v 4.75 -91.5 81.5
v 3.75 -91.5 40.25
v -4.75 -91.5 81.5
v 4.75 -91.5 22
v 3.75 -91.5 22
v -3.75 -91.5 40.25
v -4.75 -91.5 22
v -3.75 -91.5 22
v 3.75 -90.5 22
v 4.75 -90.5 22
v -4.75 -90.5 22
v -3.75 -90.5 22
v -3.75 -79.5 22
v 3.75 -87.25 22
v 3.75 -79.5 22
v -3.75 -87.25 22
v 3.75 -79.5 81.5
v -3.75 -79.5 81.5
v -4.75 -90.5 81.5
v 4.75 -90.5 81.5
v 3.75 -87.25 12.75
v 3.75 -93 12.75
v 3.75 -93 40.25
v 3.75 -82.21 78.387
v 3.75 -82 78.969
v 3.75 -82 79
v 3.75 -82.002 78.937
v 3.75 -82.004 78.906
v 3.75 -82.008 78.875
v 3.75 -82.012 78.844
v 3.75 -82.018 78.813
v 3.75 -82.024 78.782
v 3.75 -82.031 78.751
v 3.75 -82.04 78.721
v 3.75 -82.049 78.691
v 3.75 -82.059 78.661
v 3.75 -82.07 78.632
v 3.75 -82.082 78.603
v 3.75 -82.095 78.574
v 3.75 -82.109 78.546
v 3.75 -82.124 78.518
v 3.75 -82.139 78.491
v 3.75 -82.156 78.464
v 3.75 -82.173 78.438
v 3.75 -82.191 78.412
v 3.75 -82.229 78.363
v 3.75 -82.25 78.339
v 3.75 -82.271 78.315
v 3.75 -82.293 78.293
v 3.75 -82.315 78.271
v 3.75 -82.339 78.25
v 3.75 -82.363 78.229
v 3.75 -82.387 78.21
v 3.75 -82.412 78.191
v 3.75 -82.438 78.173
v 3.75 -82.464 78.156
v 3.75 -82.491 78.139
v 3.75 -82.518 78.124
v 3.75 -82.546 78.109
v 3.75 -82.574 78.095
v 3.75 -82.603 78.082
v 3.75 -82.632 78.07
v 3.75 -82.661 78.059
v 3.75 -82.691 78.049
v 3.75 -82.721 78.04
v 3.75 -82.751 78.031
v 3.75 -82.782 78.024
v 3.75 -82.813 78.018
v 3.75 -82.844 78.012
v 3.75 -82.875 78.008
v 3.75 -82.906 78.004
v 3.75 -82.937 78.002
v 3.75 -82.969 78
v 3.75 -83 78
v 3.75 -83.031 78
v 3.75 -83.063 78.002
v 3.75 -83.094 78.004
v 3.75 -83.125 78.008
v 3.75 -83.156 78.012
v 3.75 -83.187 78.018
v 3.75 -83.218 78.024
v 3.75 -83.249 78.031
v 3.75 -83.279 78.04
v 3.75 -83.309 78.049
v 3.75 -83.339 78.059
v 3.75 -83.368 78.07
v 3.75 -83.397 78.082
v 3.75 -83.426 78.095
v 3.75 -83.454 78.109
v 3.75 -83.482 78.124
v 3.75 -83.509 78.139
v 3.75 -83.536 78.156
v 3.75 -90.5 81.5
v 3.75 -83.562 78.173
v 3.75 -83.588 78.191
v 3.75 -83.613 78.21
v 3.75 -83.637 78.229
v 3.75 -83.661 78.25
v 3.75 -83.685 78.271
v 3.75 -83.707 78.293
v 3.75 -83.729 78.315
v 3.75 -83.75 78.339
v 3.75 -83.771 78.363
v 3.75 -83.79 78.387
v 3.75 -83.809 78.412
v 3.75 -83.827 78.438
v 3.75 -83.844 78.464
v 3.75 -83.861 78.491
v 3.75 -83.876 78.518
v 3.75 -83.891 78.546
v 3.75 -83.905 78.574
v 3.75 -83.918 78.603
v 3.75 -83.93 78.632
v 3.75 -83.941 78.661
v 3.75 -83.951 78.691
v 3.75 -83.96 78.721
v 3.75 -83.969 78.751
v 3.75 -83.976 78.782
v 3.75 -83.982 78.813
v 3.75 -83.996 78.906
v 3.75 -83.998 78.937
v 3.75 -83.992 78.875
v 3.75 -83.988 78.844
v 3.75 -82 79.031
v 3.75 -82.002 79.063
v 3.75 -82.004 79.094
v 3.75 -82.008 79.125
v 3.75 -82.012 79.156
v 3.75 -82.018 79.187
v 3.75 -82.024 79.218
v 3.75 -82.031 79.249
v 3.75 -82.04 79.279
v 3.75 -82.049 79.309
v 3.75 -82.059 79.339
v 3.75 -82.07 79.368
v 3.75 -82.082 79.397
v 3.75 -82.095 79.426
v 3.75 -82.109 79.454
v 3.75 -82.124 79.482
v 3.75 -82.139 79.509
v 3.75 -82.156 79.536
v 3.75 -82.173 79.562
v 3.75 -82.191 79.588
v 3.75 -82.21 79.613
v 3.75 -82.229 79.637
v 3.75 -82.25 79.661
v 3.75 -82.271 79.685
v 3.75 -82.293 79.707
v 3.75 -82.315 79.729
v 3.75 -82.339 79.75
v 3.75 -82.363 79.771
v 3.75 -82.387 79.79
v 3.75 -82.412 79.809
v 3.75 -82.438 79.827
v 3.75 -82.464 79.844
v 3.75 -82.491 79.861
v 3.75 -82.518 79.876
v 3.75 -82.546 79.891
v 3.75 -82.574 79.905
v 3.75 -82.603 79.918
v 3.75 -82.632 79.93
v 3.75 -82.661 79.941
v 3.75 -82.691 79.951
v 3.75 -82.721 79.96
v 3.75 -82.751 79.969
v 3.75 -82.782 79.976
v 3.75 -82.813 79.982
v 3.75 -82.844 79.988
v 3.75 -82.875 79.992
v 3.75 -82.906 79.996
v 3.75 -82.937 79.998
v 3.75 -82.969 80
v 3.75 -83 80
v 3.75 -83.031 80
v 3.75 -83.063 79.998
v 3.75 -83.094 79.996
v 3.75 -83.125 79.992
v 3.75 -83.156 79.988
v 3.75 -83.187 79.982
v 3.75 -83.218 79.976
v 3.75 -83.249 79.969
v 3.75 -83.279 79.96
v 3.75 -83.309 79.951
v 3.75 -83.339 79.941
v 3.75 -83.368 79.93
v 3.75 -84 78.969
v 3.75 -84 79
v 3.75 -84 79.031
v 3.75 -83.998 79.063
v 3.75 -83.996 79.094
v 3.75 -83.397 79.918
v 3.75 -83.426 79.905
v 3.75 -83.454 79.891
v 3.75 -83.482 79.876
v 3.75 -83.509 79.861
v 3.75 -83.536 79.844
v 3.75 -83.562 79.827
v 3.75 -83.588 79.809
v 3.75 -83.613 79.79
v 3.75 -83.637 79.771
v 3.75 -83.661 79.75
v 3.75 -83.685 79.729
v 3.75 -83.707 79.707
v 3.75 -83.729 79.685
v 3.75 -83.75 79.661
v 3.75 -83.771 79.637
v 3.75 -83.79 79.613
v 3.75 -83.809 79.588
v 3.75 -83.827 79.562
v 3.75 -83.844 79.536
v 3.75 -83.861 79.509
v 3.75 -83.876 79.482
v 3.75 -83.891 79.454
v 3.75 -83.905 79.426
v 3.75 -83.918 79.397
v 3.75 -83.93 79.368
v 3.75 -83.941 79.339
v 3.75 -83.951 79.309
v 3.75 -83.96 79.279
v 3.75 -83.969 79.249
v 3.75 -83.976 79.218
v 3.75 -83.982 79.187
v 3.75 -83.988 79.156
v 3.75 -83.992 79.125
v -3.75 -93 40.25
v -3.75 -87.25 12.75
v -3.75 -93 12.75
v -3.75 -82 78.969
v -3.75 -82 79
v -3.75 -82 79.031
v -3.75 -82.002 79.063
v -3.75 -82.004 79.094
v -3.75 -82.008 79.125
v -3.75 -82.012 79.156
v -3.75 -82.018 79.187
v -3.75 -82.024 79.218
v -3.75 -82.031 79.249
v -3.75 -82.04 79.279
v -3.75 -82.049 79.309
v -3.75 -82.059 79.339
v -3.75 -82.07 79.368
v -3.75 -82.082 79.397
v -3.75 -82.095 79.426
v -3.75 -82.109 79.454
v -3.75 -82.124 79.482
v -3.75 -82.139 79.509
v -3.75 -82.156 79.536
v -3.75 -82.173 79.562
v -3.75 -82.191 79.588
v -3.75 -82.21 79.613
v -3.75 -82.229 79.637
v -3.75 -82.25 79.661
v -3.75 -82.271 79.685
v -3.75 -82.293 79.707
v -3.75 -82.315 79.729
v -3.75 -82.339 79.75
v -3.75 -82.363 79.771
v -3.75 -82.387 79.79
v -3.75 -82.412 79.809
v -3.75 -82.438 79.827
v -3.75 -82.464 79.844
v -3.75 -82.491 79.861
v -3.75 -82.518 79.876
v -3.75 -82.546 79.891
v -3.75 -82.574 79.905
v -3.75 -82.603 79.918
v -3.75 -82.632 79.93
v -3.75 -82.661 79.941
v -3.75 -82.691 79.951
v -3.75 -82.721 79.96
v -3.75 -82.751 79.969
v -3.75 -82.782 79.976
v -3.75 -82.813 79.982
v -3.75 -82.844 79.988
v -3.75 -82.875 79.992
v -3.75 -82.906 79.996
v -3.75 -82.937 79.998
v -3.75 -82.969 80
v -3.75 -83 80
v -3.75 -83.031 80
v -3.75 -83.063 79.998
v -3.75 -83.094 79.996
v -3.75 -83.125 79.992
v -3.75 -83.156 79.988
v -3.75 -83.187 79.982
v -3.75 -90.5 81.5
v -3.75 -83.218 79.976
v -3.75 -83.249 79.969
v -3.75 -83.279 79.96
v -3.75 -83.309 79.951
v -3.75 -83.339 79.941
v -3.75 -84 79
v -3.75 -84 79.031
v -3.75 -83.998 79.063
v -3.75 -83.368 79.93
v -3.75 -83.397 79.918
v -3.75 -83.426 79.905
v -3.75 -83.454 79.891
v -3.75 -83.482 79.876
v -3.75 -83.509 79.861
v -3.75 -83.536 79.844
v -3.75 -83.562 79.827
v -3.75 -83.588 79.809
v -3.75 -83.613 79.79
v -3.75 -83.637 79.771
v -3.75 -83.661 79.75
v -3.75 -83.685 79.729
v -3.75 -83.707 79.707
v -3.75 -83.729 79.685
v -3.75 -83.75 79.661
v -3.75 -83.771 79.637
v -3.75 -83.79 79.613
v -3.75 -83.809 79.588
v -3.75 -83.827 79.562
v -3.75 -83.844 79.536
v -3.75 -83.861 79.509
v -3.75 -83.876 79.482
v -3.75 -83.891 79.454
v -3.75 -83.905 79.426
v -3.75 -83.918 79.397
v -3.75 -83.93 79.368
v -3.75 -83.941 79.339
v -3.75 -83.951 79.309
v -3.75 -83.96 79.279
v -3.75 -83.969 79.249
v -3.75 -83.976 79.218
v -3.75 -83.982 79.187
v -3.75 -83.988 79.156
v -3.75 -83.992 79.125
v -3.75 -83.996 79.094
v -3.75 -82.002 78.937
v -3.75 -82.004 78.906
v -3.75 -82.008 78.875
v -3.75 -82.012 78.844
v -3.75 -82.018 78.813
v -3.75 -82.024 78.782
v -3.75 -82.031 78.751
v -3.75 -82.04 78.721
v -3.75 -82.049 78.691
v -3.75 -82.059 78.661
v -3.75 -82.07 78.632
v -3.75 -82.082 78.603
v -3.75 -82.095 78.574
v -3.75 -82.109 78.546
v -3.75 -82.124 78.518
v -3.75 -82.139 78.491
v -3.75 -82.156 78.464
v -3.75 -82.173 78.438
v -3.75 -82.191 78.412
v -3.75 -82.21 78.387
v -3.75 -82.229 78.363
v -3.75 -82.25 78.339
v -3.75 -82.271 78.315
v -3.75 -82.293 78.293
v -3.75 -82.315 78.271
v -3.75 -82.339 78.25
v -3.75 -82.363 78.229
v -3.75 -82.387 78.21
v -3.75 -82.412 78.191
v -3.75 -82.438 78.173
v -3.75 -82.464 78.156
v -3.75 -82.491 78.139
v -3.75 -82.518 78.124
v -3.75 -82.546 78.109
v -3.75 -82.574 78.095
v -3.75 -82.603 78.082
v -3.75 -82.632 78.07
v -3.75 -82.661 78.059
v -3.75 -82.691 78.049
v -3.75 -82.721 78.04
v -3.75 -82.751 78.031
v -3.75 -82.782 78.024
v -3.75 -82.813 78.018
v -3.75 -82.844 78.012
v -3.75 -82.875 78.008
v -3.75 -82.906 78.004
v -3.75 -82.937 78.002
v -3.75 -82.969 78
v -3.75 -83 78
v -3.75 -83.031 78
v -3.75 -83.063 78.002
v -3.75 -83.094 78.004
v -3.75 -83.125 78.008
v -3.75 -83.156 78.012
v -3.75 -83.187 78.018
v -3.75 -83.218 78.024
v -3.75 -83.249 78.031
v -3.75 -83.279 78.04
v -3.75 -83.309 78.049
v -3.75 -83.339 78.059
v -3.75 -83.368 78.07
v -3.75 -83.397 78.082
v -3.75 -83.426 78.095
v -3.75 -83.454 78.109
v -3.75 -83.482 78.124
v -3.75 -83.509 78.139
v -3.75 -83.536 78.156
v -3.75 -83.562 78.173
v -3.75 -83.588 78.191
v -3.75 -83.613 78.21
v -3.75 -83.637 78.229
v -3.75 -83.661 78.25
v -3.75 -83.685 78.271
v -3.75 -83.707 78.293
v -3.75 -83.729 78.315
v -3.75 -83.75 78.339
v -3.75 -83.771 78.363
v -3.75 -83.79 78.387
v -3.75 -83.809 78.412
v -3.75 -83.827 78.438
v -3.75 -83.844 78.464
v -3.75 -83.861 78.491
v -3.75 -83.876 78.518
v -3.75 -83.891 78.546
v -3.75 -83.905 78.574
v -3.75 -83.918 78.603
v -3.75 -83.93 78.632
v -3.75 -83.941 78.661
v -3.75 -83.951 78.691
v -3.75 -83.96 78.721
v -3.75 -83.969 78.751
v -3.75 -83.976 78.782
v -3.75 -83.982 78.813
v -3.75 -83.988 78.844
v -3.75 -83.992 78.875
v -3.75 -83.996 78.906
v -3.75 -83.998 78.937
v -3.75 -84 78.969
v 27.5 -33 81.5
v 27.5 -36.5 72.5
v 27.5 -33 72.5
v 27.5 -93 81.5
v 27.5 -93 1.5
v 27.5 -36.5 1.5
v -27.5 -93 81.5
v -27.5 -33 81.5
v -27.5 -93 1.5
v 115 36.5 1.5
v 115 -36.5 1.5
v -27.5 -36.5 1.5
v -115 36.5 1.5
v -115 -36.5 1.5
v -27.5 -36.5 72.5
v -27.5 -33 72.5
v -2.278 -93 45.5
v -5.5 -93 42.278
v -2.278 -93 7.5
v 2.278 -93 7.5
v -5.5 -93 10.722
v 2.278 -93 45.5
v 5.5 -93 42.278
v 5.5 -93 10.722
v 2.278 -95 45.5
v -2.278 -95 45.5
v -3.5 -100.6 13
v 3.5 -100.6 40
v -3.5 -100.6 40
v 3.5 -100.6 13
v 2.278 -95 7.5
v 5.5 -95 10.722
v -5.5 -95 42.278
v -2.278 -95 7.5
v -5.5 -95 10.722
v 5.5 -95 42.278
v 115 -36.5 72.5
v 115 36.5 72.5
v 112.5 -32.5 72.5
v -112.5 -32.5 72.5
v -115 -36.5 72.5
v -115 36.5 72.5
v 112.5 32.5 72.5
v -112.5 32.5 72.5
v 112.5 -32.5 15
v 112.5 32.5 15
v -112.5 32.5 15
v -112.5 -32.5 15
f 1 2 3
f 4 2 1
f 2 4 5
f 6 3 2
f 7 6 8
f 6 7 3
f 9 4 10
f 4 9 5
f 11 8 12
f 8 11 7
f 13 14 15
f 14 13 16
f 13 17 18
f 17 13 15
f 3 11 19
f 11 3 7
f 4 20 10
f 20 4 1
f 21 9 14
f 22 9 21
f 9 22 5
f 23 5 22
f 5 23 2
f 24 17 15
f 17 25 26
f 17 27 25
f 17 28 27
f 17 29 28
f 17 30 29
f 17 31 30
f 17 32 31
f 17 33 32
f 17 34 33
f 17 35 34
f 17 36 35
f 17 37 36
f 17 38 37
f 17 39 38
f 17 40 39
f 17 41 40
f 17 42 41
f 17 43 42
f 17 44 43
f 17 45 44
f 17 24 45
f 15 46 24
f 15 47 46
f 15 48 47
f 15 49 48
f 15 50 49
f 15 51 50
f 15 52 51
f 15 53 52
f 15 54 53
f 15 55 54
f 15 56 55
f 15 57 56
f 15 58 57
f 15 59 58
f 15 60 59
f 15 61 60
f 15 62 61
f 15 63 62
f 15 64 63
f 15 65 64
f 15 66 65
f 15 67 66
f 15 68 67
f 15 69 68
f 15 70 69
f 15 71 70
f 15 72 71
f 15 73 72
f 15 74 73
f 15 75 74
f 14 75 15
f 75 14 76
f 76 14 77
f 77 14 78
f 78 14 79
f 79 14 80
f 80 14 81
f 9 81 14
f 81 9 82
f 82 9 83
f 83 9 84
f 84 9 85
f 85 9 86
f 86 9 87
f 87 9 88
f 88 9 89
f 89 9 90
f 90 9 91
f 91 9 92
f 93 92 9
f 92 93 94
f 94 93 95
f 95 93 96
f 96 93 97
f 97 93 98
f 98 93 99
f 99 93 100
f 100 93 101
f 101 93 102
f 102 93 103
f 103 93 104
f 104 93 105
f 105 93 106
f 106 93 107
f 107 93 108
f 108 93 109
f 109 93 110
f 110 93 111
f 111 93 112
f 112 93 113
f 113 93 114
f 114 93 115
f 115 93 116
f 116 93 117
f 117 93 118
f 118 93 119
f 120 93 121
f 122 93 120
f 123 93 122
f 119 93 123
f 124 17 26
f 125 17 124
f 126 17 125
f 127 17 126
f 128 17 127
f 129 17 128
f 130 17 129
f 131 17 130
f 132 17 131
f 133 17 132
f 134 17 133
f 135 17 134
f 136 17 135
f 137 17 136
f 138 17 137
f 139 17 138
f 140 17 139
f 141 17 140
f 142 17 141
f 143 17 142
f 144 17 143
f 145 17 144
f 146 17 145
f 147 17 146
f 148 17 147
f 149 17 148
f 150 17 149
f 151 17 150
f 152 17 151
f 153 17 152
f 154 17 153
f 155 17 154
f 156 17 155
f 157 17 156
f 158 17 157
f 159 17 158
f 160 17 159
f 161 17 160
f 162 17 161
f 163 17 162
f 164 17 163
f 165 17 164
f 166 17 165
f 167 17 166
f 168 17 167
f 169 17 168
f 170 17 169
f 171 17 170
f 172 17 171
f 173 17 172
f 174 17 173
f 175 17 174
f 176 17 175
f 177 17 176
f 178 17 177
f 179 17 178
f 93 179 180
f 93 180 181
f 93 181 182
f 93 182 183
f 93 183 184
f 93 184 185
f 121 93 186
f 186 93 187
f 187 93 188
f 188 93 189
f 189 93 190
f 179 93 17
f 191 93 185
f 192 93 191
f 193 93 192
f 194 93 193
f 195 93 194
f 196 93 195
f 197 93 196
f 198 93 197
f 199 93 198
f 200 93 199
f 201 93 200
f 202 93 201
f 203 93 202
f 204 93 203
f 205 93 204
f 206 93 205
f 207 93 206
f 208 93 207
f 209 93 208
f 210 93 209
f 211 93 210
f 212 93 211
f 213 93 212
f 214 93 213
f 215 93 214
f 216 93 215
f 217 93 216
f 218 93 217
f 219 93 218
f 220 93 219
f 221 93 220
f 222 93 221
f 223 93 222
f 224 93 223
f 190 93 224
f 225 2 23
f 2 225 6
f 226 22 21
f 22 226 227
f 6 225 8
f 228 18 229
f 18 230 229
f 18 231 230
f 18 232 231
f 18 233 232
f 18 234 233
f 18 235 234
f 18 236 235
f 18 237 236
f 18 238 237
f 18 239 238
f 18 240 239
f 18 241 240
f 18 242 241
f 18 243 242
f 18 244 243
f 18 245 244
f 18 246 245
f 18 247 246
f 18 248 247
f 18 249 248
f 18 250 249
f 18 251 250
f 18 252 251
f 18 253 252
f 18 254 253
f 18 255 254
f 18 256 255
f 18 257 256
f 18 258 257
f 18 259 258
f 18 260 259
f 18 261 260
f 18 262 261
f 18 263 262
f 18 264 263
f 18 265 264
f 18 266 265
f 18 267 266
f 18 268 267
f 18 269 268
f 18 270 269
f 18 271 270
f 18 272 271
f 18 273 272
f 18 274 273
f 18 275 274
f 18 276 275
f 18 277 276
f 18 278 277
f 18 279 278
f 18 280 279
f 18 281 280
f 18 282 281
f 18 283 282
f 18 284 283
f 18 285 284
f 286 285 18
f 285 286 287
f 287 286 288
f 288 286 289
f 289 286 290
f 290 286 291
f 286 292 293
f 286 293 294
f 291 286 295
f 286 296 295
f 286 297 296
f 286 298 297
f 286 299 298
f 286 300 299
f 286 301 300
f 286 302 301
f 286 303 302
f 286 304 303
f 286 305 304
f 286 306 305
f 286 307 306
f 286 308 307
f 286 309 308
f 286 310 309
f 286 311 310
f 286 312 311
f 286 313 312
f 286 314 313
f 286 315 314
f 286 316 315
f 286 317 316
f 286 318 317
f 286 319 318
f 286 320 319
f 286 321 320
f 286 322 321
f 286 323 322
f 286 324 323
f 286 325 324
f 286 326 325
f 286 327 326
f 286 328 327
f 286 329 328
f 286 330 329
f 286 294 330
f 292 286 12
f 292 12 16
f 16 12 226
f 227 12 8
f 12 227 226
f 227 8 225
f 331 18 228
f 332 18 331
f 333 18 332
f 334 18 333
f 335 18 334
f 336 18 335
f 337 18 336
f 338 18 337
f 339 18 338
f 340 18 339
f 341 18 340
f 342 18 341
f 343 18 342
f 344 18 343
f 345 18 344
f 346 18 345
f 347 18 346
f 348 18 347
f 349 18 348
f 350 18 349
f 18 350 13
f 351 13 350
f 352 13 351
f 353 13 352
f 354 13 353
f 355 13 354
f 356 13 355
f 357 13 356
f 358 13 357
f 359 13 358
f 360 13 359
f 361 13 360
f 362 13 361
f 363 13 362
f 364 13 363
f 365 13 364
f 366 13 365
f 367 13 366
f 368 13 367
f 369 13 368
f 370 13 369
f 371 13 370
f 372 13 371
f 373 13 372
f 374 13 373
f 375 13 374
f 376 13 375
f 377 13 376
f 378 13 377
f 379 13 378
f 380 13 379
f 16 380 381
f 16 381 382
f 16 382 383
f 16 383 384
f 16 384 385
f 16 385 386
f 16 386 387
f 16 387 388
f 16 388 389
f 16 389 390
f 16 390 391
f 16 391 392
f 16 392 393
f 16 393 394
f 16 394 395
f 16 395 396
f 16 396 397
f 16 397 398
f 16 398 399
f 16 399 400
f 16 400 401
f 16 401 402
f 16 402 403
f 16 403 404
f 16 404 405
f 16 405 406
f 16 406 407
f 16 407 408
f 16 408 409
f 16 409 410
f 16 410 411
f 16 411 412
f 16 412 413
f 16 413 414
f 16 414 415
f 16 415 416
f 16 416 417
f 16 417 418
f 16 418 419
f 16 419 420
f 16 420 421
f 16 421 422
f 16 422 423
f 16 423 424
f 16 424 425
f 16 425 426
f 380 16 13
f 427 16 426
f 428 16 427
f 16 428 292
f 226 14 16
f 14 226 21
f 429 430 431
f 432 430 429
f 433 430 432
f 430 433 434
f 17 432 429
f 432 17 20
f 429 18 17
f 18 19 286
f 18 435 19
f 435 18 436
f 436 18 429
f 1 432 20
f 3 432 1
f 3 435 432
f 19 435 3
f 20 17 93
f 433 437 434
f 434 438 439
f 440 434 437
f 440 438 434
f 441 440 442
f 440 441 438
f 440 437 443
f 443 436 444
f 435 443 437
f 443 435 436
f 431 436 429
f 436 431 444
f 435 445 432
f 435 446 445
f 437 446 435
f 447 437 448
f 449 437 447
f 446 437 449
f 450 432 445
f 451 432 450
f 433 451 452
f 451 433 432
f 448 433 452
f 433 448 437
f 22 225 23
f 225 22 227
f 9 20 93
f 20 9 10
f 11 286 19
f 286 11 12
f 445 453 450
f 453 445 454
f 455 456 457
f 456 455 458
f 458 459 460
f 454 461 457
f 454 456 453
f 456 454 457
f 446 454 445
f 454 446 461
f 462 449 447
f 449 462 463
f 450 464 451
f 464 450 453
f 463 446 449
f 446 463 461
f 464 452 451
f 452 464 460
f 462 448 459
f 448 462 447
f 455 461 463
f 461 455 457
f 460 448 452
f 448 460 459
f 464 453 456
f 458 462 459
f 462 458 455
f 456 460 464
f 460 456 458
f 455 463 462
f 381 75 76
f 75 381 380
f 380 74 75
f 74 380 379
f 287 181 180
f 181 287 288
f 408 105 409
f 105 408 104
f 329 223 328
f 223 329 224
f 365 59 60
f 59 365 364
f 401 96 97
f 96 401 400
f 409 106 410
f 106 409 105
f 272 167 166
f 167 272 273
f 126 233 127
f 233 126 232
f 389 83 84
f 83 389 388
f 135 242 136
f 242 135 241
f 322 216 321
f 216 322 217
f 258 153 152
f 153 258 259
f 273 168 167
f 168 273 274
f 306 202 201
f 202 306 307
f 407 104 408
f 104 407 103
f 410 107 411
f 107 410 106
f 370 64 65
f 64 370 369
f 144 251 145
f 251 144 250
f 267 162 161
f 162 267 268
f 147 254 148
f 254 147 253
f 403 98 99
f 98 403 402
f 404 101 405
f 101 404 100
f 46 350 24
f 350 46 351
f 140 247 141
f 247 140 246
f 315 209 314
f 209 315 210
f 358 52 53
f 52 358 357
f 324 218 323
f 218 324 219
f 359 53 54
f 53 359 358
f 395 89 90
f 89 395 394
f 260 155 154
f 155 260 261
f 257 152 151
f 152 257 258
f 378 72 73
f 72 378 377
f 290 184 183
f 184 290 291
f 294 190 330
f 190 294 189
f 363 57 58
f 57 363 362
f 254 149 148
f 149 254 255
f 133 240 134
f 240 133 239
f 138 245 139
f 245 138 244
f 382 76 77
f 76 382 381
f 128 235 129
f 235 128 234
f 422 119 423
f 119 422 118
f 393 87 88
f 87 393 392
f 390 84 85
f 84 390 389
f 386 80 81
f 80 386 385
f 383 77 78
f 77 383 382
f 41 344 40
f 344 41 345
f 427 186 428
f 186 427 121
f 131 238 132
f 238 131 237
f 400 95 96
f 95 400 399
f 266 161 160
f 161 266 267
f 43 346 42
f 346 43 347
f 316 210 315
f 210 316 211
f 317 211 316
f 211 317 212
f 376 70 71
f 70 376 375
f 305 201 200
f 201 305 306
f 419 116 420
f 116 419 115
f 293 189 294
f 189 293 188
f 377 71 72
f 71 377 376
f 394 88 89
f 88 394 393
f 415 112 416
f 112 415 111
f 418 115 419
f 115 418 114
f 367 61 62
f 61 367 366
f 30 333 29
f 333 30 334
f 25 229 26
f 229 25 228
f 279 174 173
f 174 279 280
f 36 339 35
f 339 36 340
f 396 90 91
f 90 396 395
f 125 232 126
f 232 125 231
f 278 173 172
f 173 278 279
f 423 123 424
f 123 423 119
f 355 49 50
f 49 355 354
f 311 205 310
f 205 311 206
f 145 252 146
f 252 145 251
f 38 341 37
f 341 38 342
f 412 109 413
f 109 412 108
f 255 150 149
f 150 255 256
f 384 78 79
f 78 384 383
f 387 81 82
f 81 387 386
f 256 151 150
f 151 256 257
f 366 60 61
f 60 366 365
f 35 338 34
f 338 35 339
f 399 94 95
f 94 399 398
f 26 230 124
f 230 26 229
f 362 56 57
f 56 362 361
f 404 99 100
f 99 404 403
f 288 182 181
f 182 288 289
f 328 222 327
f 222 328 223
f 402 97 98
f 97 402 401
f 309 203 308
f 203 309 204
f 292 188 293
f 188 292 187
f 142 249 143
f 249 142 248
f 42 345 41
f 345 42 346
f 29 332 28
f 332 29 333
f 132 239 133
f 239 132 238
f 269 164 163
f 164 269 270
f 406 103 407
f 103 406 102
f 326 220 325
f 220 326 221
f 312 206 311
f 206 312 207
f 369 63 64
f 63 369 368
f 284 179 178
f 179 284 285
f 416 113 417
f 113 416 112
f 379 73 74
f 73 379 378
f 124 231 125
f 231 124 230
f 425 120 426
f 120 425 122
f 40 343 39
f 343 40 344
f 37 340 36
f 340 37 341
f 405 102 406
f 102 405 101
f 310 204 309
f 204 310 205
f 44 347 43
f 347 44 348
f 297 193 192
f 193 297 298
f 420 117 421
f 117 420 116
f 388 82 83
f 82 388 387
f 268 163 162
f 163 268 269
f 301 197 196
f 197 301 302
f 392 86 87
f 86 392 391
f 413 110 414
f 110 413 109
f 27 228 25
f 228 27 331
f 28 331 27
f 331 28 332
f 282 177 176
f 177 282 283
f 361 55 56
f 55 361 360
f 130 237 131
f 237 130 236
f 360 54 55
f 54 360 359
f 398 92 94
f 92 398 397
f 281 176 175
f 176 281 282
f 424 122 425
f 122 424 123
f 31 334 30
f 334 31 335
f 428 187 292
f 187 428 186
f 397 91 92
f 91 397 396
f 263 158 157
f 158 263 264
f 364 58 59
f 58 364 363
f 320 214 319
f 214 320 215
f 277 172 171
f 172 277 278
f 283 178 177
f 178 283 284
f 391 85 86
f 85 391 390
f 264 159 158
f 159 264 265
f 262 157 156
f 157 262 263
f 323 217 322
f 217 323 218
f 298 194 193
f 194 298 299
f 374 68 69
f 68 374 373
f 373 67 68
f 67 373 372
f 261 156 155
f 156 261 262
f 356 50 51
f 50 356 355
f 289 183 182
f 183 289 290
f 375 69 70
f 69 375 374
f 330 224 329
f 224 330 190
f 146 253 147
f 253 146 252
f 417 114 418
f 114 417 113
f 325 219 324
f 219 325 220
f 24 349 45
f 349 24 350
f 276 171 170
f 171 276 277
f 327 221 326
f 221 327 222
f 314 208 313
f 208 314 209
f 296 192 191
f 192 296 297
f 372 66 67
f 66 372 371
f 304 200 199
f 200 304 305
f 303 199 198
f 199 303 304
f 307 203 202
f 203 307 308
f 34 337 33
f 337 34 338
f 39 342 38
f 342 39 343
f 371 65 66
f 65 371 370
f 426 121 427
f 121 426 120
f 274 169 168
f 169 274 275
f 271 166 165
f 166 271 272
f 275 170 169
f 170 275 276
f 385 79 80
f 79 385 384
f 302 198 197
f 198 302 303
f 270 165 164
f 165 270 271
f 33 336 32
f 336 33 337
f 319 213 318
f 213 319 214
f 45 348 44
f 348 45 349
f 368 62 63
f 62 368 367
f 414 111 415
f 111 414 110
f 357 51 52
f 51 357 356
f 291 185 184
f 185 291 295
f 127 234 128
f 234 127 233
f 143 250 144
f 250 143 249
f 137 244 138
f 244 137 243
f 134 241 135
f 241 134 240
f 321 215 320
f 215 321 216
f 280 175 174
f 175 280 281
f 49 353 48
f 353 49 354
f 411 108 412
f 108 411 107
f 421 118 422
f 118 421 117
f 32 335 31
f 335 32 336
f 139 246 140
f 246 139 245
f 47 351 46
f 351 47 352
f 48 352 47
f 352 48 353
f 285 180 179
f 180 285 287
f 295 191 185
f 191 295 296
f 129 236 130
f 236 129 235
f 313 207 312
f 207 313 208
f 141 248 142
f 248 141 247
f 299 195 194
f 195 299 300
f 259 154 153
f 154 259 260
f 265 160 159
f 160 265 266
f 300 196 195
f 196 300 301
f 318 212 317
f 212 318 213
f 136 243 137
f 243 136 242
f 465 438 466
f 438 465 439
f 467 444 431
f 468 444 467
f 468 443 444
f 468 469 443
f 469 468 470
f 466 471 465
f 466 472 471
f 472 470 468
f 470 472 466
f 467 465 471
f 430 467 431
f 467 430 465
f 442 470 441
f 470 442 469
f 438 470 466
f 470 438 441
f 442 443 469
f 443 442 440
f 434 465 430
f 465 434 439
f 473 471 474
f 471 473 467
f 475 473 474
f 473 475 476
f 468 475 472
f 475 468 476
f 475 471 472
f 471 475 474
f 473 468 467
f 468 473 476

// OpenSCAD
// file: notched_attachment.scad
/*
//does not go to 116 or higher
sb_hight = 80; 
//dont make this longer its a waist of filament.:
sb_width = 40;
sb_length = 55;*/

notch_mating_gap = 0.0;

notch_rim_radius = 5.5 + notch_mating_gap;
notch_rim_height = 2 + notch_mating_gap;

notch_tip_length = 27 + notch_mating_gap;
notch_tip_width = 7 + notch_mating_gap;
notch_tip_height = 7.6 + notch_mating_gap;

magnet_length = 27.5;
magnet_width = 7.5;
magnet_hight = magnet_width;

module magnet(){
    cube([magnet_length,magnet_width,magnet_hight],center = true);
}

module spacing_box (sb_hight = 80,sb_width = 40,sb_length = 55
){
    
    difference(){
        translate([0,0,sb_hight/2])
            cube([sb_length,
                  sb_width,
                  sb_hight],center = true);
    union(){
        translate([0,-40,30])
           rotate([0,90,270])
               translate([-15,0,magnet_hight-2])
                   magnet();
        
        translate([0,-sb_width/2 + magnet_width*2 -2, sb_hight/10 +25])
             rotate([0,0,270])
                 translate([5.5,-0,magnet_hight+20])
        
                     cube([magnet_width*2 -3,magnet_width+2,sb_hight ],center = true);
            
        translate([0,-sb_width/2 +2,25])
            cube([magnet_hight,magnet_width,magnet_length], center = true);
        
        }
    }


}


module atachment_notch(sb_hight = 80,sb_width = 40,sb_length = 55, 
) {
  
  translate([sb_hight/2-20,0,-7])  
      rotate([-90,0,90])  
          spacing_box(sb_hight,sb_width,sb_length);
    
  hull(){
    translate([sb_hight/2 - 45,0,sb_width/2 - 7]){
      translate([notch_tip_length/2, 0, notch_rim_height/2]) rotate([0, 0, 360/16])
        cylinder(h = notch_rim_height, r = notch_rim_radius / cos(360/16), $fn = 8, center = true);
      translate([notch_tip_length/-2, 0, notch_rim_height/2]) rotate([0, 0, 360/16])
        cylinder(h = notch_rim_height, r = notch_rim_radius / cos(360/16), $fn = 8, center = true);
      translate([0, 0, notch_tip_height/2])
        cube([notch_tip_length, notch_tip_width, notch_tip_height], center = true);
        
    }
}
 
        translate([-sb_hight/2 - 17.5,4.5,sb_width/2 - 17])
            rotate([90,0,0])
                cylinder(r=1 , h= 9 , $fn = 200);
    
    difference(){
    
        
    
      translate([-20,0,sb_width/2 - 17])
        cube([sb_hight,magnet_width+2,magnet_hight*2],center = true);
    
      translate([0,-0,sb_width/2 - 16])
        cube([magnet_length*30,magnet_width,magnet_hight*2],center = true);
    
    }
    }


/*
atachment_notch (sb_hight = 90,sb_width = 40,sb_length = 55
);
//*/
// main file
include<notched_attachment.scad>;

speaker_box_hight = 60; 
speaker_box_width = 80;
speaker_box_length = 230; 
//does not go to 116 or higher
spacer_box_hight = speaker_box_hight + 20;
//dont make this longer its a waist of filament.:
spacer_box_width = 60; //!
spacer_box_length = 55;

usb_cutout_hight = 50;
usb_cutout_width = 15;
usb_cutout_length = 55;


  translate([0,-spacer_box_hight + 10,spacer_box_hight/2 - 18.5])
    rotate([0,90,270])
      atachment_notch(spacer_box_hight,spacer_box_width,spacer_box_length);

difference(){
  translate([0,0,37])
    cube([speaker_box_length,speaker_box_width-7,speaker_box_hight+11],center = true);

  translate([0,0,45])
    cube([speaker_box_length-5,speaker_box_width-15,speaker_box_hight],center = true);
}
